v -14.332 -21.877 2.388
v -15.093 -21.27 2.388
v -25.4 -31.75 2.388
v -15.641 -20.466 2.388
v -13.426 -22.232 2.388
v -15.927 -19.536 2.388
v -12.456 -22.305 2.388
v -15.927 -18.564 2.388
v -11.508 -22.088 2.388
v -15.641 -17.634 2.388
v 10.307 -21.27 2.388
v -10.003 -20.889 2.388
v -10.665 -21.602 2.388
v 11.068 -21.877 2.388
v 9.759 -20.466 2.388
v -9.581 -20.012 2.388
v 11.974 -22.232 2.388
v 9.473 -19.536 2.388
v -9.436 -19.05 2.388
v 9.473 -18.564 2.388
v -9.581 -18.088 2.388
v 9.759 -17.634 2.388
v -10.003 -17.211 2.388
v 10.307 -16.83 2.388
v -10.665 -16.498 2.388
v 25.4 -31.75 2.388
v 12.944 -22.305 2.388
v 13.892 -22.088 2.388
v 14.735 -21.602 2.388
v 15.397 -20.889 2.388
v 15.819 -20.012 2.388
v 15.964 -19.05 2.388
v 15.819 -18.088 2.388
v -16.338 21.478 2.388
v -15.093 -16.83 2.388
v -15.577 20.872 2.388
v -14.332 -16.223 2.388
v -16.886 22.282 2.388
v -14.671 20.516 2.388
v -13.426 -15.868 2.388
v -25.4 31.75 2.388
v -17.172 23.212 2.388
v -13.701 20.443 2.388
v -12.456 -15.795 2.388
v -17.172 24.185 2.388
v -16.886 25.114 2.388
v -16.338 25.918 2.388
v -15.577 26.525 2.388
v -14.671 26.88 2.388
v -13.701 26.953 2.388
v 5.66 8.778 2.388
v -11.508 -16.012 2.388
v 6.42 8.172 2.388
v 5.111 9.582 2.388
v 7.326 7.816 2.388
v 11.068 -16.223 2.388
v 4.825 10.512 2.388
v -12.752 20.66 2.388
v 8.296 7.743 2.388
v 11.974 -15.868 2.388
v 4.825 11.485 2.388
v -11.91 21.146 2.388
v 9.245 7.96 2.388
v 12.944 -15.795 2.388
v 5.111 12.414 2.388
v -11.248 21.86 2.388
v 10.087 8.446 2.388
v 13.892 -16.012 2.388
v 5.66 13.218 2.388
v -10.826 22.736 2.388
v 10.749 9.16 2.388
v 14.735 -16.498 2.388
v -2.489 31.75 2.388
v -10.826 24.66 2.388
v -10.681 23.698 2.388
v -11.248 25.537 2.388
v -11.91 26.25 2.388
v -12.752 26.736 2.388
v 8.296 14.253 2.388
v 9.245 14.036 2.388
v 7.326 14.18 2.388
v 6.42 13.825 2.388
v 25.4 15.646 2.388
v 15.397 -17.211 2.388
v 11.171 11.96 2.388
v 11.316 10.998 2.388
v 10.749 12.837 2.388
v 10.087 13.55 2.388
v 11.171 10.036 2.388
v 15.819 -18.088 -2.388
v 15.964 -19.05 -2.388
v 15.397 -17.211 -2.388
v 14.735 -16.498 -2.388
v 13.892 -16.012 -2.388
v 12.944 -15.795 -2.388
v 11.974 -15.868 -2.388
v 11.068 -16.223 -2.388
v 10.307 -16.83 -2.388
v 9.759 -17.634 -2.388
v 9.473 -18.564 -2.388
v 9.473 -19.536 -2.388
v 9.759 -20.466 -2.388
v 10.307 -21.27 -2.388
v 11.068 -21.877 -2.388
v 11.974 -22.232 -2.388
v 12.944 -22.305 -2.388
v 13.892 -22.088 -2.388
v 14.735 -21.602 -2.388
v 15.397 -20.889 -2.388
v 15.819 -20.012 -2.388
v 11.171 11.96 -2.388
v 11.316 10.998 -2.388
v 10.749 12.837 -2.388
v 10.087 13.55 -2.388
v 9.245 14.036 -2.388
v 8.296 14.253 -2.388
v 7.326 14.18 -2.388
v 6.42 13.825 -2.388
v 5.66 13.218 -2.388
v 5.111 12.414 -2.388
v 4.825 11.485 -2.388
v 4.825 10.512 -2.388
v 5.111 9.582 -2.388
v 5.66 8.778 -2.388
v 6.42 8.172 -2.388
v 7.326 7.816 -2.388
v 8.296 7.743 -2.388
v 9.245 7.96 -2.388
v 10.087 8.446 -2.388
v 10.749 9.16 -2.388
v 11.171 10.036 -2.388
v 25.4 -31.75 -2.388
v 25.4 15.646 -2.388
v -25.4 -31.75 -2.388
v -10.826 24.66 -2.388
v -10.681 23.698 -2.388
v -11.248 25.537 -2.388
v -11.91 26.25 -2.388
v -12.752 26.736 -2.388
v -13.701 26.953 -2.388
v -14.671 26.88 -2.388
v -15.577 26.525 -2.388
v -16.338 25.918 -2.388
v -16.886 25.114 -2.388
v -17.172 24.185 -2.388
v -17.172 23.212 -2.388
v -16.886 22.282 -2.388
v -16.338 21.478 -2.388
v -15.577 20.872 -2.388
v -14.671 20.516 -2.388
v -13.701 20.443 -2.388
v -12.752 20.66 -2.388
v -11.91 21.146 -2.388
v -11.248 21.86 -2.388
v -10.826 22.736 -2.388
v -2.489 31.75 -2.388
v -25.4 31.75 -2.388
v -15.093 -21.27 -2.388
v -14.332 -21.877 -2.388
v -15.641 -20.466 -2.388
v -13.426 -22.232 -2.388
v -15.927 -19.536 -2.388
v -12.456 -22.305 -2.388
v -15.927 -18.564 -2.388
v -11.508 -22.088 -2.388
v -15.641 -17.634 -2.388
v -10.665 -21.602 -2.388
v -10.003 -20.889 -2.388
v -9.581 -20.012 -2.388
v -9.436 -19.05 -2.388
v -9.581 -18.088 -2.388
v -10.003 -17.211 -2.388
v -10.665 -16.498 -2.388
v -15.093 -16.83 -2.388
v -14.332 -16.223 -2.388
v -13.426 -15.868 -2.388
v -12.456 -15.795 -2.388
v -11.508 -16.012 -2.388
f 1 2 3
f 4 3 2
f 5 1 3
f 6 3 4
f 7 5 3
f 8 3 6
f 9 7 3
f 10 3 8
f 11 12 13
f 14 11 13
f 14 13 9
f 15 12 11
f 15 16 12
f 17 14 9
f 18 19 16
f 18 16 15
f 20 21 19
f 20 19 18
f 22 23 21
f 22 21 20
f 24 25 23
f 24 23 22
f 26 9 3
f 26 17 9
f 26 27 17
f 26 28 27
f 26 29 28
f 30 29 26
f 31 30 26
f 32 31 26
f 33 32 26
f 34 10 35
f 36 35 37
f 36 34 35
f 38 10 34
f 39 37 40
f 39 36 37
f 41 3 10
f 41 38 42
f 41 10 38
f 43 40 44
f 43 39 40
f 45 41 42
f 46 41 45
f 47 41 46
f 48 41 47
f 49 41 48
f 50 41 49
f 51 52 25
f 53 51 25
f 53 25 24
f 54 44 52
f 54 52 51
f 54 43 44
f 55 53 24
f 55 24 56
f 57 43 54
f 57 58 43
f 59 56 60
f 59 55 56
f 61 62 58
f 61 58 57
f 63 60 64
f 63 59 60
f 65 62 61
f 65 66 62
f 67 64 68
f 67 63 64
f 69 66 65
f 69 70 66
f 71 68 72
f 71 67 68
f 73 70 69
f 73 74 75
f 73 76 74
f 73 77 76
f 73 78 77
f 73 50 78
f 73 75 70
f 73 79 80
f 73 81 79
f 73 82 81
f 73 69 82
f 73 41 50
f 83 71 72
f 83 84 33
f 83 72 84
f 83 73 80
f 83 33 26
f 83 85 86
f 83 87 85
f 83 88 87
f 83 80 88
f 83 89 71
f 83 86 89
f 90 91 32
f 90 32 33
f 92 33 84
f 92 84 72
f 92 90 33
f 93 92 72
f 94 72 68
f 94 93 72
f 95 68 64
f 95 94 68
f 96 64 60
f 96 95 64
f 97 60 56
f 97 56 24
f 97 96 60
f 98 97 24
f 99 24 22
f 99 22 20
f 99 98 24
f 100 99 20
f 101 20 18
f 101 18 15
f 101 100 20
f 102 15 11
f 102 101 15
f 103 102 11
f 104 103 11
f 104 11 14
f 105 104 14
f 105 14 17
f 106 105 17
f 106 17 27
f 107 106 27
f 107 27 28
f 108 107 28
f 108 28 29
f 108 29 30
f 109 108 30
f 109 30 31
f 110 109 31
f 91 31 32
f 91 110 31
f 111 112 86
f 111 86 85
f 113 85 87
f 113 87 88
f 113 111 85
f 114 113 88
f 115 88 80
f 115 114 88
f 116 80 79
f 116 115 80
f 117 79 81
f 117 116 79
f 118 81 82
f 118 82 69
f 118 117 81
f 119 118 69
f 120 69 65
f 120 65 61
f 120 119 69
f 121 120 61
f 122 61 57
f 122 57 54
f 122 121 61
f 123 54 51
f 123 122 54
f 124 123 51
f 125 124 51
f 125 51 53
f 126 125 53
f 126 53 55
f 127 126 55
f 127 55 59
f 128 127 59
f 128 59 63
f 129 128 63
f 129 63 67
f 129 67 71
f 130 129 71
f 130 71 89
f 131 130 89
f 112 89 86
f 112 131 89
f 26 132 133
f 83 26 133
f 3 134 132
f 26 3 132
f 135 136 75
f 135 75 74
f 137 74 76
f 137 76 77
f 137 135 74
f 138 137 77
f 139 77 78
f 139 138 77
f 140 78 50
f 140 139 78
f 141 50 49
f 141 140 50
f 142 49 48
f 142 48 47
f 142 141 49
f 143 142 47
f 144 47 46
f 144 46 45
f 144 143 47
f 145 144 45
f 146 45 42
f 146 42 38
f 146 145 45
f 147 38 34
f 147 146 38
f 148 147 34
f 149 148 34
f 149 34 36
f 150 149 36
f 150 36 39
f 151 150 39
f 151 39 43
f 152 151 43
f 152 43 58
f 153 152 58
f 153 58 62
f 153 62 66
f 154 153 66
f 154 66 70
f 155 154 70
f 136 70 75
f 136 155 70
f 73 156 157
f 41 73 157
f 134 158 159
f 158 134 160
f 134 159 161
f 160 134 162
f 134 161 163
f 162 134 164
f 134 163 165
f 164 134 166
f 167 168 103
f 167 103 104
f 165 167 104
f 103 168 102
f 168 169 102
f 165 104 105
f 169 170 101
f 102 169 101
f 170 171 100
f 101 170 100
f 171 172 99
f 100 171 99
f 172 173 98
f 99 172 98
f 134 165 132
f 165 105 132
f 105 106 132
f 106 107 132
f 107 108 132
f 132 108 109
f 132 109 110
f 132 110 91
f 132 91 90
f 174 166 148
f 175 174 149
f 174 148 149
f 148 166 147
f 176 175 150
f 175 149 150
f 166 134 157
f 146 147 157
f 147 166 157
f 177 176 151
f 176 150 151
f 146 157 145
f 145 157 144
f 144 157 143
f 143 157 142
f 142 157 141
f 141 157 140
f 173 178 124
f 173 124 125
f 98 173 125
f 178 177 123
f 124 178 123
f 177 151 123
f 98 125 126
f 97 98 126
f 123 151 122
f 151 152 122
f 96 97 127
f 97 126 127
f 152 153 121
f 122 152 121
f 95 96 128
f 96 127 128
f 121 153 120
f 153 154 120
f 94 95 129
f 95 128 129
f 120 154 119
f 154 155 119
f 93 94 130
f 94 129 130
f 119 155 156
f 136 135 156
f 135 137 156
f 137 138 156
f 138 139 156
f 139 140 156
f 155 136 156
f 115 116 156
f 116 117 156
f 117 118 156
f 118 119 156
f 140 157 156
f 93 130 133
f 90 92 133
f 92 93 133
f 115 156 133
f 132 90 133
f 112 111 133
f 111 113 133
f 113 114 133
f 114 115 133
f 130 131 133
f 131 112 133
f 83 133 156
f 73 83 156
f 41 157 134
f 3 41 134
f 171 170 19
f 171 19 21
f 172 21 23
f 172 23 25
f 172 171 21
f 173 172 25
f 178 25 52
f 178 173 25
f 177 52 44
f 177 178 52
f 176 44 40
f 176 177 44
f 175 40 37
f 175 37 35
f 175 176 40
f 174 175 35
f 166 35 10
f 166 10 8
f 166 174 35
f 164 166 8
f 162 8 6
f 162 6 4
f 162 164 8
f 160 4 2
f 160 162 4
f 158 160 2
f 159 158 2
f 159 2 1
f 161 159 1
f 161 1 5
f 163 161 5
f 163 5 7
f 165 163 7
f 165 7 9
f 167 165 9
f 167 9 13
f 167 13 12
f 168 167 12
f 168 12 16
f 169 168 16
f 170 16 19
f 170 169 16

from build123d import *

# Parameters (mm, degrees)
BOSS_EXTRUDE1_DEPTH      = 2.3876
BOSS_EXTRUDE1_DEPTH_BACK = 2.3876
SKETCH3_R                = 3.2639


with BuildPart() as part:
    # Sketch3 → Boss-Extrude1 (new, two sides: drawn at the far end of the back side and taken through both)
    with BuildSketch(Plane.XY.offset(-BOSS_EXTRUDE1_DEPTH_BACK)):
        Polygon((25.4, -31.75), (25.4, 15.6464), (-2.4892, 31.75), (-25.4, 31.75), (-25.4, -31.75), align=None)
        with Locations((12.7, -19.05)):
            Circle(SKETCH3_R, mode=Mode.SUBTRACT)
        with Locations((8.052122612, 10.9982)):
            Circle(SKETCH3_R, mode=Mode.SUBTRACT)
        with Locations((-12.7, -19.05)):
            Circle(SKETCH3_R, mode=Mode.SUBTRACT)
        with Locations((-13.944922644, 23.6982)):
            Circle(SKETCH3_R, mode=Mode.SUBTRACT)
    extrude(amount=BOSS_EXTRUDE1_DEPTH + BOSS_EXTRUDE1_DEPTH_BACK)


solid = part.part
